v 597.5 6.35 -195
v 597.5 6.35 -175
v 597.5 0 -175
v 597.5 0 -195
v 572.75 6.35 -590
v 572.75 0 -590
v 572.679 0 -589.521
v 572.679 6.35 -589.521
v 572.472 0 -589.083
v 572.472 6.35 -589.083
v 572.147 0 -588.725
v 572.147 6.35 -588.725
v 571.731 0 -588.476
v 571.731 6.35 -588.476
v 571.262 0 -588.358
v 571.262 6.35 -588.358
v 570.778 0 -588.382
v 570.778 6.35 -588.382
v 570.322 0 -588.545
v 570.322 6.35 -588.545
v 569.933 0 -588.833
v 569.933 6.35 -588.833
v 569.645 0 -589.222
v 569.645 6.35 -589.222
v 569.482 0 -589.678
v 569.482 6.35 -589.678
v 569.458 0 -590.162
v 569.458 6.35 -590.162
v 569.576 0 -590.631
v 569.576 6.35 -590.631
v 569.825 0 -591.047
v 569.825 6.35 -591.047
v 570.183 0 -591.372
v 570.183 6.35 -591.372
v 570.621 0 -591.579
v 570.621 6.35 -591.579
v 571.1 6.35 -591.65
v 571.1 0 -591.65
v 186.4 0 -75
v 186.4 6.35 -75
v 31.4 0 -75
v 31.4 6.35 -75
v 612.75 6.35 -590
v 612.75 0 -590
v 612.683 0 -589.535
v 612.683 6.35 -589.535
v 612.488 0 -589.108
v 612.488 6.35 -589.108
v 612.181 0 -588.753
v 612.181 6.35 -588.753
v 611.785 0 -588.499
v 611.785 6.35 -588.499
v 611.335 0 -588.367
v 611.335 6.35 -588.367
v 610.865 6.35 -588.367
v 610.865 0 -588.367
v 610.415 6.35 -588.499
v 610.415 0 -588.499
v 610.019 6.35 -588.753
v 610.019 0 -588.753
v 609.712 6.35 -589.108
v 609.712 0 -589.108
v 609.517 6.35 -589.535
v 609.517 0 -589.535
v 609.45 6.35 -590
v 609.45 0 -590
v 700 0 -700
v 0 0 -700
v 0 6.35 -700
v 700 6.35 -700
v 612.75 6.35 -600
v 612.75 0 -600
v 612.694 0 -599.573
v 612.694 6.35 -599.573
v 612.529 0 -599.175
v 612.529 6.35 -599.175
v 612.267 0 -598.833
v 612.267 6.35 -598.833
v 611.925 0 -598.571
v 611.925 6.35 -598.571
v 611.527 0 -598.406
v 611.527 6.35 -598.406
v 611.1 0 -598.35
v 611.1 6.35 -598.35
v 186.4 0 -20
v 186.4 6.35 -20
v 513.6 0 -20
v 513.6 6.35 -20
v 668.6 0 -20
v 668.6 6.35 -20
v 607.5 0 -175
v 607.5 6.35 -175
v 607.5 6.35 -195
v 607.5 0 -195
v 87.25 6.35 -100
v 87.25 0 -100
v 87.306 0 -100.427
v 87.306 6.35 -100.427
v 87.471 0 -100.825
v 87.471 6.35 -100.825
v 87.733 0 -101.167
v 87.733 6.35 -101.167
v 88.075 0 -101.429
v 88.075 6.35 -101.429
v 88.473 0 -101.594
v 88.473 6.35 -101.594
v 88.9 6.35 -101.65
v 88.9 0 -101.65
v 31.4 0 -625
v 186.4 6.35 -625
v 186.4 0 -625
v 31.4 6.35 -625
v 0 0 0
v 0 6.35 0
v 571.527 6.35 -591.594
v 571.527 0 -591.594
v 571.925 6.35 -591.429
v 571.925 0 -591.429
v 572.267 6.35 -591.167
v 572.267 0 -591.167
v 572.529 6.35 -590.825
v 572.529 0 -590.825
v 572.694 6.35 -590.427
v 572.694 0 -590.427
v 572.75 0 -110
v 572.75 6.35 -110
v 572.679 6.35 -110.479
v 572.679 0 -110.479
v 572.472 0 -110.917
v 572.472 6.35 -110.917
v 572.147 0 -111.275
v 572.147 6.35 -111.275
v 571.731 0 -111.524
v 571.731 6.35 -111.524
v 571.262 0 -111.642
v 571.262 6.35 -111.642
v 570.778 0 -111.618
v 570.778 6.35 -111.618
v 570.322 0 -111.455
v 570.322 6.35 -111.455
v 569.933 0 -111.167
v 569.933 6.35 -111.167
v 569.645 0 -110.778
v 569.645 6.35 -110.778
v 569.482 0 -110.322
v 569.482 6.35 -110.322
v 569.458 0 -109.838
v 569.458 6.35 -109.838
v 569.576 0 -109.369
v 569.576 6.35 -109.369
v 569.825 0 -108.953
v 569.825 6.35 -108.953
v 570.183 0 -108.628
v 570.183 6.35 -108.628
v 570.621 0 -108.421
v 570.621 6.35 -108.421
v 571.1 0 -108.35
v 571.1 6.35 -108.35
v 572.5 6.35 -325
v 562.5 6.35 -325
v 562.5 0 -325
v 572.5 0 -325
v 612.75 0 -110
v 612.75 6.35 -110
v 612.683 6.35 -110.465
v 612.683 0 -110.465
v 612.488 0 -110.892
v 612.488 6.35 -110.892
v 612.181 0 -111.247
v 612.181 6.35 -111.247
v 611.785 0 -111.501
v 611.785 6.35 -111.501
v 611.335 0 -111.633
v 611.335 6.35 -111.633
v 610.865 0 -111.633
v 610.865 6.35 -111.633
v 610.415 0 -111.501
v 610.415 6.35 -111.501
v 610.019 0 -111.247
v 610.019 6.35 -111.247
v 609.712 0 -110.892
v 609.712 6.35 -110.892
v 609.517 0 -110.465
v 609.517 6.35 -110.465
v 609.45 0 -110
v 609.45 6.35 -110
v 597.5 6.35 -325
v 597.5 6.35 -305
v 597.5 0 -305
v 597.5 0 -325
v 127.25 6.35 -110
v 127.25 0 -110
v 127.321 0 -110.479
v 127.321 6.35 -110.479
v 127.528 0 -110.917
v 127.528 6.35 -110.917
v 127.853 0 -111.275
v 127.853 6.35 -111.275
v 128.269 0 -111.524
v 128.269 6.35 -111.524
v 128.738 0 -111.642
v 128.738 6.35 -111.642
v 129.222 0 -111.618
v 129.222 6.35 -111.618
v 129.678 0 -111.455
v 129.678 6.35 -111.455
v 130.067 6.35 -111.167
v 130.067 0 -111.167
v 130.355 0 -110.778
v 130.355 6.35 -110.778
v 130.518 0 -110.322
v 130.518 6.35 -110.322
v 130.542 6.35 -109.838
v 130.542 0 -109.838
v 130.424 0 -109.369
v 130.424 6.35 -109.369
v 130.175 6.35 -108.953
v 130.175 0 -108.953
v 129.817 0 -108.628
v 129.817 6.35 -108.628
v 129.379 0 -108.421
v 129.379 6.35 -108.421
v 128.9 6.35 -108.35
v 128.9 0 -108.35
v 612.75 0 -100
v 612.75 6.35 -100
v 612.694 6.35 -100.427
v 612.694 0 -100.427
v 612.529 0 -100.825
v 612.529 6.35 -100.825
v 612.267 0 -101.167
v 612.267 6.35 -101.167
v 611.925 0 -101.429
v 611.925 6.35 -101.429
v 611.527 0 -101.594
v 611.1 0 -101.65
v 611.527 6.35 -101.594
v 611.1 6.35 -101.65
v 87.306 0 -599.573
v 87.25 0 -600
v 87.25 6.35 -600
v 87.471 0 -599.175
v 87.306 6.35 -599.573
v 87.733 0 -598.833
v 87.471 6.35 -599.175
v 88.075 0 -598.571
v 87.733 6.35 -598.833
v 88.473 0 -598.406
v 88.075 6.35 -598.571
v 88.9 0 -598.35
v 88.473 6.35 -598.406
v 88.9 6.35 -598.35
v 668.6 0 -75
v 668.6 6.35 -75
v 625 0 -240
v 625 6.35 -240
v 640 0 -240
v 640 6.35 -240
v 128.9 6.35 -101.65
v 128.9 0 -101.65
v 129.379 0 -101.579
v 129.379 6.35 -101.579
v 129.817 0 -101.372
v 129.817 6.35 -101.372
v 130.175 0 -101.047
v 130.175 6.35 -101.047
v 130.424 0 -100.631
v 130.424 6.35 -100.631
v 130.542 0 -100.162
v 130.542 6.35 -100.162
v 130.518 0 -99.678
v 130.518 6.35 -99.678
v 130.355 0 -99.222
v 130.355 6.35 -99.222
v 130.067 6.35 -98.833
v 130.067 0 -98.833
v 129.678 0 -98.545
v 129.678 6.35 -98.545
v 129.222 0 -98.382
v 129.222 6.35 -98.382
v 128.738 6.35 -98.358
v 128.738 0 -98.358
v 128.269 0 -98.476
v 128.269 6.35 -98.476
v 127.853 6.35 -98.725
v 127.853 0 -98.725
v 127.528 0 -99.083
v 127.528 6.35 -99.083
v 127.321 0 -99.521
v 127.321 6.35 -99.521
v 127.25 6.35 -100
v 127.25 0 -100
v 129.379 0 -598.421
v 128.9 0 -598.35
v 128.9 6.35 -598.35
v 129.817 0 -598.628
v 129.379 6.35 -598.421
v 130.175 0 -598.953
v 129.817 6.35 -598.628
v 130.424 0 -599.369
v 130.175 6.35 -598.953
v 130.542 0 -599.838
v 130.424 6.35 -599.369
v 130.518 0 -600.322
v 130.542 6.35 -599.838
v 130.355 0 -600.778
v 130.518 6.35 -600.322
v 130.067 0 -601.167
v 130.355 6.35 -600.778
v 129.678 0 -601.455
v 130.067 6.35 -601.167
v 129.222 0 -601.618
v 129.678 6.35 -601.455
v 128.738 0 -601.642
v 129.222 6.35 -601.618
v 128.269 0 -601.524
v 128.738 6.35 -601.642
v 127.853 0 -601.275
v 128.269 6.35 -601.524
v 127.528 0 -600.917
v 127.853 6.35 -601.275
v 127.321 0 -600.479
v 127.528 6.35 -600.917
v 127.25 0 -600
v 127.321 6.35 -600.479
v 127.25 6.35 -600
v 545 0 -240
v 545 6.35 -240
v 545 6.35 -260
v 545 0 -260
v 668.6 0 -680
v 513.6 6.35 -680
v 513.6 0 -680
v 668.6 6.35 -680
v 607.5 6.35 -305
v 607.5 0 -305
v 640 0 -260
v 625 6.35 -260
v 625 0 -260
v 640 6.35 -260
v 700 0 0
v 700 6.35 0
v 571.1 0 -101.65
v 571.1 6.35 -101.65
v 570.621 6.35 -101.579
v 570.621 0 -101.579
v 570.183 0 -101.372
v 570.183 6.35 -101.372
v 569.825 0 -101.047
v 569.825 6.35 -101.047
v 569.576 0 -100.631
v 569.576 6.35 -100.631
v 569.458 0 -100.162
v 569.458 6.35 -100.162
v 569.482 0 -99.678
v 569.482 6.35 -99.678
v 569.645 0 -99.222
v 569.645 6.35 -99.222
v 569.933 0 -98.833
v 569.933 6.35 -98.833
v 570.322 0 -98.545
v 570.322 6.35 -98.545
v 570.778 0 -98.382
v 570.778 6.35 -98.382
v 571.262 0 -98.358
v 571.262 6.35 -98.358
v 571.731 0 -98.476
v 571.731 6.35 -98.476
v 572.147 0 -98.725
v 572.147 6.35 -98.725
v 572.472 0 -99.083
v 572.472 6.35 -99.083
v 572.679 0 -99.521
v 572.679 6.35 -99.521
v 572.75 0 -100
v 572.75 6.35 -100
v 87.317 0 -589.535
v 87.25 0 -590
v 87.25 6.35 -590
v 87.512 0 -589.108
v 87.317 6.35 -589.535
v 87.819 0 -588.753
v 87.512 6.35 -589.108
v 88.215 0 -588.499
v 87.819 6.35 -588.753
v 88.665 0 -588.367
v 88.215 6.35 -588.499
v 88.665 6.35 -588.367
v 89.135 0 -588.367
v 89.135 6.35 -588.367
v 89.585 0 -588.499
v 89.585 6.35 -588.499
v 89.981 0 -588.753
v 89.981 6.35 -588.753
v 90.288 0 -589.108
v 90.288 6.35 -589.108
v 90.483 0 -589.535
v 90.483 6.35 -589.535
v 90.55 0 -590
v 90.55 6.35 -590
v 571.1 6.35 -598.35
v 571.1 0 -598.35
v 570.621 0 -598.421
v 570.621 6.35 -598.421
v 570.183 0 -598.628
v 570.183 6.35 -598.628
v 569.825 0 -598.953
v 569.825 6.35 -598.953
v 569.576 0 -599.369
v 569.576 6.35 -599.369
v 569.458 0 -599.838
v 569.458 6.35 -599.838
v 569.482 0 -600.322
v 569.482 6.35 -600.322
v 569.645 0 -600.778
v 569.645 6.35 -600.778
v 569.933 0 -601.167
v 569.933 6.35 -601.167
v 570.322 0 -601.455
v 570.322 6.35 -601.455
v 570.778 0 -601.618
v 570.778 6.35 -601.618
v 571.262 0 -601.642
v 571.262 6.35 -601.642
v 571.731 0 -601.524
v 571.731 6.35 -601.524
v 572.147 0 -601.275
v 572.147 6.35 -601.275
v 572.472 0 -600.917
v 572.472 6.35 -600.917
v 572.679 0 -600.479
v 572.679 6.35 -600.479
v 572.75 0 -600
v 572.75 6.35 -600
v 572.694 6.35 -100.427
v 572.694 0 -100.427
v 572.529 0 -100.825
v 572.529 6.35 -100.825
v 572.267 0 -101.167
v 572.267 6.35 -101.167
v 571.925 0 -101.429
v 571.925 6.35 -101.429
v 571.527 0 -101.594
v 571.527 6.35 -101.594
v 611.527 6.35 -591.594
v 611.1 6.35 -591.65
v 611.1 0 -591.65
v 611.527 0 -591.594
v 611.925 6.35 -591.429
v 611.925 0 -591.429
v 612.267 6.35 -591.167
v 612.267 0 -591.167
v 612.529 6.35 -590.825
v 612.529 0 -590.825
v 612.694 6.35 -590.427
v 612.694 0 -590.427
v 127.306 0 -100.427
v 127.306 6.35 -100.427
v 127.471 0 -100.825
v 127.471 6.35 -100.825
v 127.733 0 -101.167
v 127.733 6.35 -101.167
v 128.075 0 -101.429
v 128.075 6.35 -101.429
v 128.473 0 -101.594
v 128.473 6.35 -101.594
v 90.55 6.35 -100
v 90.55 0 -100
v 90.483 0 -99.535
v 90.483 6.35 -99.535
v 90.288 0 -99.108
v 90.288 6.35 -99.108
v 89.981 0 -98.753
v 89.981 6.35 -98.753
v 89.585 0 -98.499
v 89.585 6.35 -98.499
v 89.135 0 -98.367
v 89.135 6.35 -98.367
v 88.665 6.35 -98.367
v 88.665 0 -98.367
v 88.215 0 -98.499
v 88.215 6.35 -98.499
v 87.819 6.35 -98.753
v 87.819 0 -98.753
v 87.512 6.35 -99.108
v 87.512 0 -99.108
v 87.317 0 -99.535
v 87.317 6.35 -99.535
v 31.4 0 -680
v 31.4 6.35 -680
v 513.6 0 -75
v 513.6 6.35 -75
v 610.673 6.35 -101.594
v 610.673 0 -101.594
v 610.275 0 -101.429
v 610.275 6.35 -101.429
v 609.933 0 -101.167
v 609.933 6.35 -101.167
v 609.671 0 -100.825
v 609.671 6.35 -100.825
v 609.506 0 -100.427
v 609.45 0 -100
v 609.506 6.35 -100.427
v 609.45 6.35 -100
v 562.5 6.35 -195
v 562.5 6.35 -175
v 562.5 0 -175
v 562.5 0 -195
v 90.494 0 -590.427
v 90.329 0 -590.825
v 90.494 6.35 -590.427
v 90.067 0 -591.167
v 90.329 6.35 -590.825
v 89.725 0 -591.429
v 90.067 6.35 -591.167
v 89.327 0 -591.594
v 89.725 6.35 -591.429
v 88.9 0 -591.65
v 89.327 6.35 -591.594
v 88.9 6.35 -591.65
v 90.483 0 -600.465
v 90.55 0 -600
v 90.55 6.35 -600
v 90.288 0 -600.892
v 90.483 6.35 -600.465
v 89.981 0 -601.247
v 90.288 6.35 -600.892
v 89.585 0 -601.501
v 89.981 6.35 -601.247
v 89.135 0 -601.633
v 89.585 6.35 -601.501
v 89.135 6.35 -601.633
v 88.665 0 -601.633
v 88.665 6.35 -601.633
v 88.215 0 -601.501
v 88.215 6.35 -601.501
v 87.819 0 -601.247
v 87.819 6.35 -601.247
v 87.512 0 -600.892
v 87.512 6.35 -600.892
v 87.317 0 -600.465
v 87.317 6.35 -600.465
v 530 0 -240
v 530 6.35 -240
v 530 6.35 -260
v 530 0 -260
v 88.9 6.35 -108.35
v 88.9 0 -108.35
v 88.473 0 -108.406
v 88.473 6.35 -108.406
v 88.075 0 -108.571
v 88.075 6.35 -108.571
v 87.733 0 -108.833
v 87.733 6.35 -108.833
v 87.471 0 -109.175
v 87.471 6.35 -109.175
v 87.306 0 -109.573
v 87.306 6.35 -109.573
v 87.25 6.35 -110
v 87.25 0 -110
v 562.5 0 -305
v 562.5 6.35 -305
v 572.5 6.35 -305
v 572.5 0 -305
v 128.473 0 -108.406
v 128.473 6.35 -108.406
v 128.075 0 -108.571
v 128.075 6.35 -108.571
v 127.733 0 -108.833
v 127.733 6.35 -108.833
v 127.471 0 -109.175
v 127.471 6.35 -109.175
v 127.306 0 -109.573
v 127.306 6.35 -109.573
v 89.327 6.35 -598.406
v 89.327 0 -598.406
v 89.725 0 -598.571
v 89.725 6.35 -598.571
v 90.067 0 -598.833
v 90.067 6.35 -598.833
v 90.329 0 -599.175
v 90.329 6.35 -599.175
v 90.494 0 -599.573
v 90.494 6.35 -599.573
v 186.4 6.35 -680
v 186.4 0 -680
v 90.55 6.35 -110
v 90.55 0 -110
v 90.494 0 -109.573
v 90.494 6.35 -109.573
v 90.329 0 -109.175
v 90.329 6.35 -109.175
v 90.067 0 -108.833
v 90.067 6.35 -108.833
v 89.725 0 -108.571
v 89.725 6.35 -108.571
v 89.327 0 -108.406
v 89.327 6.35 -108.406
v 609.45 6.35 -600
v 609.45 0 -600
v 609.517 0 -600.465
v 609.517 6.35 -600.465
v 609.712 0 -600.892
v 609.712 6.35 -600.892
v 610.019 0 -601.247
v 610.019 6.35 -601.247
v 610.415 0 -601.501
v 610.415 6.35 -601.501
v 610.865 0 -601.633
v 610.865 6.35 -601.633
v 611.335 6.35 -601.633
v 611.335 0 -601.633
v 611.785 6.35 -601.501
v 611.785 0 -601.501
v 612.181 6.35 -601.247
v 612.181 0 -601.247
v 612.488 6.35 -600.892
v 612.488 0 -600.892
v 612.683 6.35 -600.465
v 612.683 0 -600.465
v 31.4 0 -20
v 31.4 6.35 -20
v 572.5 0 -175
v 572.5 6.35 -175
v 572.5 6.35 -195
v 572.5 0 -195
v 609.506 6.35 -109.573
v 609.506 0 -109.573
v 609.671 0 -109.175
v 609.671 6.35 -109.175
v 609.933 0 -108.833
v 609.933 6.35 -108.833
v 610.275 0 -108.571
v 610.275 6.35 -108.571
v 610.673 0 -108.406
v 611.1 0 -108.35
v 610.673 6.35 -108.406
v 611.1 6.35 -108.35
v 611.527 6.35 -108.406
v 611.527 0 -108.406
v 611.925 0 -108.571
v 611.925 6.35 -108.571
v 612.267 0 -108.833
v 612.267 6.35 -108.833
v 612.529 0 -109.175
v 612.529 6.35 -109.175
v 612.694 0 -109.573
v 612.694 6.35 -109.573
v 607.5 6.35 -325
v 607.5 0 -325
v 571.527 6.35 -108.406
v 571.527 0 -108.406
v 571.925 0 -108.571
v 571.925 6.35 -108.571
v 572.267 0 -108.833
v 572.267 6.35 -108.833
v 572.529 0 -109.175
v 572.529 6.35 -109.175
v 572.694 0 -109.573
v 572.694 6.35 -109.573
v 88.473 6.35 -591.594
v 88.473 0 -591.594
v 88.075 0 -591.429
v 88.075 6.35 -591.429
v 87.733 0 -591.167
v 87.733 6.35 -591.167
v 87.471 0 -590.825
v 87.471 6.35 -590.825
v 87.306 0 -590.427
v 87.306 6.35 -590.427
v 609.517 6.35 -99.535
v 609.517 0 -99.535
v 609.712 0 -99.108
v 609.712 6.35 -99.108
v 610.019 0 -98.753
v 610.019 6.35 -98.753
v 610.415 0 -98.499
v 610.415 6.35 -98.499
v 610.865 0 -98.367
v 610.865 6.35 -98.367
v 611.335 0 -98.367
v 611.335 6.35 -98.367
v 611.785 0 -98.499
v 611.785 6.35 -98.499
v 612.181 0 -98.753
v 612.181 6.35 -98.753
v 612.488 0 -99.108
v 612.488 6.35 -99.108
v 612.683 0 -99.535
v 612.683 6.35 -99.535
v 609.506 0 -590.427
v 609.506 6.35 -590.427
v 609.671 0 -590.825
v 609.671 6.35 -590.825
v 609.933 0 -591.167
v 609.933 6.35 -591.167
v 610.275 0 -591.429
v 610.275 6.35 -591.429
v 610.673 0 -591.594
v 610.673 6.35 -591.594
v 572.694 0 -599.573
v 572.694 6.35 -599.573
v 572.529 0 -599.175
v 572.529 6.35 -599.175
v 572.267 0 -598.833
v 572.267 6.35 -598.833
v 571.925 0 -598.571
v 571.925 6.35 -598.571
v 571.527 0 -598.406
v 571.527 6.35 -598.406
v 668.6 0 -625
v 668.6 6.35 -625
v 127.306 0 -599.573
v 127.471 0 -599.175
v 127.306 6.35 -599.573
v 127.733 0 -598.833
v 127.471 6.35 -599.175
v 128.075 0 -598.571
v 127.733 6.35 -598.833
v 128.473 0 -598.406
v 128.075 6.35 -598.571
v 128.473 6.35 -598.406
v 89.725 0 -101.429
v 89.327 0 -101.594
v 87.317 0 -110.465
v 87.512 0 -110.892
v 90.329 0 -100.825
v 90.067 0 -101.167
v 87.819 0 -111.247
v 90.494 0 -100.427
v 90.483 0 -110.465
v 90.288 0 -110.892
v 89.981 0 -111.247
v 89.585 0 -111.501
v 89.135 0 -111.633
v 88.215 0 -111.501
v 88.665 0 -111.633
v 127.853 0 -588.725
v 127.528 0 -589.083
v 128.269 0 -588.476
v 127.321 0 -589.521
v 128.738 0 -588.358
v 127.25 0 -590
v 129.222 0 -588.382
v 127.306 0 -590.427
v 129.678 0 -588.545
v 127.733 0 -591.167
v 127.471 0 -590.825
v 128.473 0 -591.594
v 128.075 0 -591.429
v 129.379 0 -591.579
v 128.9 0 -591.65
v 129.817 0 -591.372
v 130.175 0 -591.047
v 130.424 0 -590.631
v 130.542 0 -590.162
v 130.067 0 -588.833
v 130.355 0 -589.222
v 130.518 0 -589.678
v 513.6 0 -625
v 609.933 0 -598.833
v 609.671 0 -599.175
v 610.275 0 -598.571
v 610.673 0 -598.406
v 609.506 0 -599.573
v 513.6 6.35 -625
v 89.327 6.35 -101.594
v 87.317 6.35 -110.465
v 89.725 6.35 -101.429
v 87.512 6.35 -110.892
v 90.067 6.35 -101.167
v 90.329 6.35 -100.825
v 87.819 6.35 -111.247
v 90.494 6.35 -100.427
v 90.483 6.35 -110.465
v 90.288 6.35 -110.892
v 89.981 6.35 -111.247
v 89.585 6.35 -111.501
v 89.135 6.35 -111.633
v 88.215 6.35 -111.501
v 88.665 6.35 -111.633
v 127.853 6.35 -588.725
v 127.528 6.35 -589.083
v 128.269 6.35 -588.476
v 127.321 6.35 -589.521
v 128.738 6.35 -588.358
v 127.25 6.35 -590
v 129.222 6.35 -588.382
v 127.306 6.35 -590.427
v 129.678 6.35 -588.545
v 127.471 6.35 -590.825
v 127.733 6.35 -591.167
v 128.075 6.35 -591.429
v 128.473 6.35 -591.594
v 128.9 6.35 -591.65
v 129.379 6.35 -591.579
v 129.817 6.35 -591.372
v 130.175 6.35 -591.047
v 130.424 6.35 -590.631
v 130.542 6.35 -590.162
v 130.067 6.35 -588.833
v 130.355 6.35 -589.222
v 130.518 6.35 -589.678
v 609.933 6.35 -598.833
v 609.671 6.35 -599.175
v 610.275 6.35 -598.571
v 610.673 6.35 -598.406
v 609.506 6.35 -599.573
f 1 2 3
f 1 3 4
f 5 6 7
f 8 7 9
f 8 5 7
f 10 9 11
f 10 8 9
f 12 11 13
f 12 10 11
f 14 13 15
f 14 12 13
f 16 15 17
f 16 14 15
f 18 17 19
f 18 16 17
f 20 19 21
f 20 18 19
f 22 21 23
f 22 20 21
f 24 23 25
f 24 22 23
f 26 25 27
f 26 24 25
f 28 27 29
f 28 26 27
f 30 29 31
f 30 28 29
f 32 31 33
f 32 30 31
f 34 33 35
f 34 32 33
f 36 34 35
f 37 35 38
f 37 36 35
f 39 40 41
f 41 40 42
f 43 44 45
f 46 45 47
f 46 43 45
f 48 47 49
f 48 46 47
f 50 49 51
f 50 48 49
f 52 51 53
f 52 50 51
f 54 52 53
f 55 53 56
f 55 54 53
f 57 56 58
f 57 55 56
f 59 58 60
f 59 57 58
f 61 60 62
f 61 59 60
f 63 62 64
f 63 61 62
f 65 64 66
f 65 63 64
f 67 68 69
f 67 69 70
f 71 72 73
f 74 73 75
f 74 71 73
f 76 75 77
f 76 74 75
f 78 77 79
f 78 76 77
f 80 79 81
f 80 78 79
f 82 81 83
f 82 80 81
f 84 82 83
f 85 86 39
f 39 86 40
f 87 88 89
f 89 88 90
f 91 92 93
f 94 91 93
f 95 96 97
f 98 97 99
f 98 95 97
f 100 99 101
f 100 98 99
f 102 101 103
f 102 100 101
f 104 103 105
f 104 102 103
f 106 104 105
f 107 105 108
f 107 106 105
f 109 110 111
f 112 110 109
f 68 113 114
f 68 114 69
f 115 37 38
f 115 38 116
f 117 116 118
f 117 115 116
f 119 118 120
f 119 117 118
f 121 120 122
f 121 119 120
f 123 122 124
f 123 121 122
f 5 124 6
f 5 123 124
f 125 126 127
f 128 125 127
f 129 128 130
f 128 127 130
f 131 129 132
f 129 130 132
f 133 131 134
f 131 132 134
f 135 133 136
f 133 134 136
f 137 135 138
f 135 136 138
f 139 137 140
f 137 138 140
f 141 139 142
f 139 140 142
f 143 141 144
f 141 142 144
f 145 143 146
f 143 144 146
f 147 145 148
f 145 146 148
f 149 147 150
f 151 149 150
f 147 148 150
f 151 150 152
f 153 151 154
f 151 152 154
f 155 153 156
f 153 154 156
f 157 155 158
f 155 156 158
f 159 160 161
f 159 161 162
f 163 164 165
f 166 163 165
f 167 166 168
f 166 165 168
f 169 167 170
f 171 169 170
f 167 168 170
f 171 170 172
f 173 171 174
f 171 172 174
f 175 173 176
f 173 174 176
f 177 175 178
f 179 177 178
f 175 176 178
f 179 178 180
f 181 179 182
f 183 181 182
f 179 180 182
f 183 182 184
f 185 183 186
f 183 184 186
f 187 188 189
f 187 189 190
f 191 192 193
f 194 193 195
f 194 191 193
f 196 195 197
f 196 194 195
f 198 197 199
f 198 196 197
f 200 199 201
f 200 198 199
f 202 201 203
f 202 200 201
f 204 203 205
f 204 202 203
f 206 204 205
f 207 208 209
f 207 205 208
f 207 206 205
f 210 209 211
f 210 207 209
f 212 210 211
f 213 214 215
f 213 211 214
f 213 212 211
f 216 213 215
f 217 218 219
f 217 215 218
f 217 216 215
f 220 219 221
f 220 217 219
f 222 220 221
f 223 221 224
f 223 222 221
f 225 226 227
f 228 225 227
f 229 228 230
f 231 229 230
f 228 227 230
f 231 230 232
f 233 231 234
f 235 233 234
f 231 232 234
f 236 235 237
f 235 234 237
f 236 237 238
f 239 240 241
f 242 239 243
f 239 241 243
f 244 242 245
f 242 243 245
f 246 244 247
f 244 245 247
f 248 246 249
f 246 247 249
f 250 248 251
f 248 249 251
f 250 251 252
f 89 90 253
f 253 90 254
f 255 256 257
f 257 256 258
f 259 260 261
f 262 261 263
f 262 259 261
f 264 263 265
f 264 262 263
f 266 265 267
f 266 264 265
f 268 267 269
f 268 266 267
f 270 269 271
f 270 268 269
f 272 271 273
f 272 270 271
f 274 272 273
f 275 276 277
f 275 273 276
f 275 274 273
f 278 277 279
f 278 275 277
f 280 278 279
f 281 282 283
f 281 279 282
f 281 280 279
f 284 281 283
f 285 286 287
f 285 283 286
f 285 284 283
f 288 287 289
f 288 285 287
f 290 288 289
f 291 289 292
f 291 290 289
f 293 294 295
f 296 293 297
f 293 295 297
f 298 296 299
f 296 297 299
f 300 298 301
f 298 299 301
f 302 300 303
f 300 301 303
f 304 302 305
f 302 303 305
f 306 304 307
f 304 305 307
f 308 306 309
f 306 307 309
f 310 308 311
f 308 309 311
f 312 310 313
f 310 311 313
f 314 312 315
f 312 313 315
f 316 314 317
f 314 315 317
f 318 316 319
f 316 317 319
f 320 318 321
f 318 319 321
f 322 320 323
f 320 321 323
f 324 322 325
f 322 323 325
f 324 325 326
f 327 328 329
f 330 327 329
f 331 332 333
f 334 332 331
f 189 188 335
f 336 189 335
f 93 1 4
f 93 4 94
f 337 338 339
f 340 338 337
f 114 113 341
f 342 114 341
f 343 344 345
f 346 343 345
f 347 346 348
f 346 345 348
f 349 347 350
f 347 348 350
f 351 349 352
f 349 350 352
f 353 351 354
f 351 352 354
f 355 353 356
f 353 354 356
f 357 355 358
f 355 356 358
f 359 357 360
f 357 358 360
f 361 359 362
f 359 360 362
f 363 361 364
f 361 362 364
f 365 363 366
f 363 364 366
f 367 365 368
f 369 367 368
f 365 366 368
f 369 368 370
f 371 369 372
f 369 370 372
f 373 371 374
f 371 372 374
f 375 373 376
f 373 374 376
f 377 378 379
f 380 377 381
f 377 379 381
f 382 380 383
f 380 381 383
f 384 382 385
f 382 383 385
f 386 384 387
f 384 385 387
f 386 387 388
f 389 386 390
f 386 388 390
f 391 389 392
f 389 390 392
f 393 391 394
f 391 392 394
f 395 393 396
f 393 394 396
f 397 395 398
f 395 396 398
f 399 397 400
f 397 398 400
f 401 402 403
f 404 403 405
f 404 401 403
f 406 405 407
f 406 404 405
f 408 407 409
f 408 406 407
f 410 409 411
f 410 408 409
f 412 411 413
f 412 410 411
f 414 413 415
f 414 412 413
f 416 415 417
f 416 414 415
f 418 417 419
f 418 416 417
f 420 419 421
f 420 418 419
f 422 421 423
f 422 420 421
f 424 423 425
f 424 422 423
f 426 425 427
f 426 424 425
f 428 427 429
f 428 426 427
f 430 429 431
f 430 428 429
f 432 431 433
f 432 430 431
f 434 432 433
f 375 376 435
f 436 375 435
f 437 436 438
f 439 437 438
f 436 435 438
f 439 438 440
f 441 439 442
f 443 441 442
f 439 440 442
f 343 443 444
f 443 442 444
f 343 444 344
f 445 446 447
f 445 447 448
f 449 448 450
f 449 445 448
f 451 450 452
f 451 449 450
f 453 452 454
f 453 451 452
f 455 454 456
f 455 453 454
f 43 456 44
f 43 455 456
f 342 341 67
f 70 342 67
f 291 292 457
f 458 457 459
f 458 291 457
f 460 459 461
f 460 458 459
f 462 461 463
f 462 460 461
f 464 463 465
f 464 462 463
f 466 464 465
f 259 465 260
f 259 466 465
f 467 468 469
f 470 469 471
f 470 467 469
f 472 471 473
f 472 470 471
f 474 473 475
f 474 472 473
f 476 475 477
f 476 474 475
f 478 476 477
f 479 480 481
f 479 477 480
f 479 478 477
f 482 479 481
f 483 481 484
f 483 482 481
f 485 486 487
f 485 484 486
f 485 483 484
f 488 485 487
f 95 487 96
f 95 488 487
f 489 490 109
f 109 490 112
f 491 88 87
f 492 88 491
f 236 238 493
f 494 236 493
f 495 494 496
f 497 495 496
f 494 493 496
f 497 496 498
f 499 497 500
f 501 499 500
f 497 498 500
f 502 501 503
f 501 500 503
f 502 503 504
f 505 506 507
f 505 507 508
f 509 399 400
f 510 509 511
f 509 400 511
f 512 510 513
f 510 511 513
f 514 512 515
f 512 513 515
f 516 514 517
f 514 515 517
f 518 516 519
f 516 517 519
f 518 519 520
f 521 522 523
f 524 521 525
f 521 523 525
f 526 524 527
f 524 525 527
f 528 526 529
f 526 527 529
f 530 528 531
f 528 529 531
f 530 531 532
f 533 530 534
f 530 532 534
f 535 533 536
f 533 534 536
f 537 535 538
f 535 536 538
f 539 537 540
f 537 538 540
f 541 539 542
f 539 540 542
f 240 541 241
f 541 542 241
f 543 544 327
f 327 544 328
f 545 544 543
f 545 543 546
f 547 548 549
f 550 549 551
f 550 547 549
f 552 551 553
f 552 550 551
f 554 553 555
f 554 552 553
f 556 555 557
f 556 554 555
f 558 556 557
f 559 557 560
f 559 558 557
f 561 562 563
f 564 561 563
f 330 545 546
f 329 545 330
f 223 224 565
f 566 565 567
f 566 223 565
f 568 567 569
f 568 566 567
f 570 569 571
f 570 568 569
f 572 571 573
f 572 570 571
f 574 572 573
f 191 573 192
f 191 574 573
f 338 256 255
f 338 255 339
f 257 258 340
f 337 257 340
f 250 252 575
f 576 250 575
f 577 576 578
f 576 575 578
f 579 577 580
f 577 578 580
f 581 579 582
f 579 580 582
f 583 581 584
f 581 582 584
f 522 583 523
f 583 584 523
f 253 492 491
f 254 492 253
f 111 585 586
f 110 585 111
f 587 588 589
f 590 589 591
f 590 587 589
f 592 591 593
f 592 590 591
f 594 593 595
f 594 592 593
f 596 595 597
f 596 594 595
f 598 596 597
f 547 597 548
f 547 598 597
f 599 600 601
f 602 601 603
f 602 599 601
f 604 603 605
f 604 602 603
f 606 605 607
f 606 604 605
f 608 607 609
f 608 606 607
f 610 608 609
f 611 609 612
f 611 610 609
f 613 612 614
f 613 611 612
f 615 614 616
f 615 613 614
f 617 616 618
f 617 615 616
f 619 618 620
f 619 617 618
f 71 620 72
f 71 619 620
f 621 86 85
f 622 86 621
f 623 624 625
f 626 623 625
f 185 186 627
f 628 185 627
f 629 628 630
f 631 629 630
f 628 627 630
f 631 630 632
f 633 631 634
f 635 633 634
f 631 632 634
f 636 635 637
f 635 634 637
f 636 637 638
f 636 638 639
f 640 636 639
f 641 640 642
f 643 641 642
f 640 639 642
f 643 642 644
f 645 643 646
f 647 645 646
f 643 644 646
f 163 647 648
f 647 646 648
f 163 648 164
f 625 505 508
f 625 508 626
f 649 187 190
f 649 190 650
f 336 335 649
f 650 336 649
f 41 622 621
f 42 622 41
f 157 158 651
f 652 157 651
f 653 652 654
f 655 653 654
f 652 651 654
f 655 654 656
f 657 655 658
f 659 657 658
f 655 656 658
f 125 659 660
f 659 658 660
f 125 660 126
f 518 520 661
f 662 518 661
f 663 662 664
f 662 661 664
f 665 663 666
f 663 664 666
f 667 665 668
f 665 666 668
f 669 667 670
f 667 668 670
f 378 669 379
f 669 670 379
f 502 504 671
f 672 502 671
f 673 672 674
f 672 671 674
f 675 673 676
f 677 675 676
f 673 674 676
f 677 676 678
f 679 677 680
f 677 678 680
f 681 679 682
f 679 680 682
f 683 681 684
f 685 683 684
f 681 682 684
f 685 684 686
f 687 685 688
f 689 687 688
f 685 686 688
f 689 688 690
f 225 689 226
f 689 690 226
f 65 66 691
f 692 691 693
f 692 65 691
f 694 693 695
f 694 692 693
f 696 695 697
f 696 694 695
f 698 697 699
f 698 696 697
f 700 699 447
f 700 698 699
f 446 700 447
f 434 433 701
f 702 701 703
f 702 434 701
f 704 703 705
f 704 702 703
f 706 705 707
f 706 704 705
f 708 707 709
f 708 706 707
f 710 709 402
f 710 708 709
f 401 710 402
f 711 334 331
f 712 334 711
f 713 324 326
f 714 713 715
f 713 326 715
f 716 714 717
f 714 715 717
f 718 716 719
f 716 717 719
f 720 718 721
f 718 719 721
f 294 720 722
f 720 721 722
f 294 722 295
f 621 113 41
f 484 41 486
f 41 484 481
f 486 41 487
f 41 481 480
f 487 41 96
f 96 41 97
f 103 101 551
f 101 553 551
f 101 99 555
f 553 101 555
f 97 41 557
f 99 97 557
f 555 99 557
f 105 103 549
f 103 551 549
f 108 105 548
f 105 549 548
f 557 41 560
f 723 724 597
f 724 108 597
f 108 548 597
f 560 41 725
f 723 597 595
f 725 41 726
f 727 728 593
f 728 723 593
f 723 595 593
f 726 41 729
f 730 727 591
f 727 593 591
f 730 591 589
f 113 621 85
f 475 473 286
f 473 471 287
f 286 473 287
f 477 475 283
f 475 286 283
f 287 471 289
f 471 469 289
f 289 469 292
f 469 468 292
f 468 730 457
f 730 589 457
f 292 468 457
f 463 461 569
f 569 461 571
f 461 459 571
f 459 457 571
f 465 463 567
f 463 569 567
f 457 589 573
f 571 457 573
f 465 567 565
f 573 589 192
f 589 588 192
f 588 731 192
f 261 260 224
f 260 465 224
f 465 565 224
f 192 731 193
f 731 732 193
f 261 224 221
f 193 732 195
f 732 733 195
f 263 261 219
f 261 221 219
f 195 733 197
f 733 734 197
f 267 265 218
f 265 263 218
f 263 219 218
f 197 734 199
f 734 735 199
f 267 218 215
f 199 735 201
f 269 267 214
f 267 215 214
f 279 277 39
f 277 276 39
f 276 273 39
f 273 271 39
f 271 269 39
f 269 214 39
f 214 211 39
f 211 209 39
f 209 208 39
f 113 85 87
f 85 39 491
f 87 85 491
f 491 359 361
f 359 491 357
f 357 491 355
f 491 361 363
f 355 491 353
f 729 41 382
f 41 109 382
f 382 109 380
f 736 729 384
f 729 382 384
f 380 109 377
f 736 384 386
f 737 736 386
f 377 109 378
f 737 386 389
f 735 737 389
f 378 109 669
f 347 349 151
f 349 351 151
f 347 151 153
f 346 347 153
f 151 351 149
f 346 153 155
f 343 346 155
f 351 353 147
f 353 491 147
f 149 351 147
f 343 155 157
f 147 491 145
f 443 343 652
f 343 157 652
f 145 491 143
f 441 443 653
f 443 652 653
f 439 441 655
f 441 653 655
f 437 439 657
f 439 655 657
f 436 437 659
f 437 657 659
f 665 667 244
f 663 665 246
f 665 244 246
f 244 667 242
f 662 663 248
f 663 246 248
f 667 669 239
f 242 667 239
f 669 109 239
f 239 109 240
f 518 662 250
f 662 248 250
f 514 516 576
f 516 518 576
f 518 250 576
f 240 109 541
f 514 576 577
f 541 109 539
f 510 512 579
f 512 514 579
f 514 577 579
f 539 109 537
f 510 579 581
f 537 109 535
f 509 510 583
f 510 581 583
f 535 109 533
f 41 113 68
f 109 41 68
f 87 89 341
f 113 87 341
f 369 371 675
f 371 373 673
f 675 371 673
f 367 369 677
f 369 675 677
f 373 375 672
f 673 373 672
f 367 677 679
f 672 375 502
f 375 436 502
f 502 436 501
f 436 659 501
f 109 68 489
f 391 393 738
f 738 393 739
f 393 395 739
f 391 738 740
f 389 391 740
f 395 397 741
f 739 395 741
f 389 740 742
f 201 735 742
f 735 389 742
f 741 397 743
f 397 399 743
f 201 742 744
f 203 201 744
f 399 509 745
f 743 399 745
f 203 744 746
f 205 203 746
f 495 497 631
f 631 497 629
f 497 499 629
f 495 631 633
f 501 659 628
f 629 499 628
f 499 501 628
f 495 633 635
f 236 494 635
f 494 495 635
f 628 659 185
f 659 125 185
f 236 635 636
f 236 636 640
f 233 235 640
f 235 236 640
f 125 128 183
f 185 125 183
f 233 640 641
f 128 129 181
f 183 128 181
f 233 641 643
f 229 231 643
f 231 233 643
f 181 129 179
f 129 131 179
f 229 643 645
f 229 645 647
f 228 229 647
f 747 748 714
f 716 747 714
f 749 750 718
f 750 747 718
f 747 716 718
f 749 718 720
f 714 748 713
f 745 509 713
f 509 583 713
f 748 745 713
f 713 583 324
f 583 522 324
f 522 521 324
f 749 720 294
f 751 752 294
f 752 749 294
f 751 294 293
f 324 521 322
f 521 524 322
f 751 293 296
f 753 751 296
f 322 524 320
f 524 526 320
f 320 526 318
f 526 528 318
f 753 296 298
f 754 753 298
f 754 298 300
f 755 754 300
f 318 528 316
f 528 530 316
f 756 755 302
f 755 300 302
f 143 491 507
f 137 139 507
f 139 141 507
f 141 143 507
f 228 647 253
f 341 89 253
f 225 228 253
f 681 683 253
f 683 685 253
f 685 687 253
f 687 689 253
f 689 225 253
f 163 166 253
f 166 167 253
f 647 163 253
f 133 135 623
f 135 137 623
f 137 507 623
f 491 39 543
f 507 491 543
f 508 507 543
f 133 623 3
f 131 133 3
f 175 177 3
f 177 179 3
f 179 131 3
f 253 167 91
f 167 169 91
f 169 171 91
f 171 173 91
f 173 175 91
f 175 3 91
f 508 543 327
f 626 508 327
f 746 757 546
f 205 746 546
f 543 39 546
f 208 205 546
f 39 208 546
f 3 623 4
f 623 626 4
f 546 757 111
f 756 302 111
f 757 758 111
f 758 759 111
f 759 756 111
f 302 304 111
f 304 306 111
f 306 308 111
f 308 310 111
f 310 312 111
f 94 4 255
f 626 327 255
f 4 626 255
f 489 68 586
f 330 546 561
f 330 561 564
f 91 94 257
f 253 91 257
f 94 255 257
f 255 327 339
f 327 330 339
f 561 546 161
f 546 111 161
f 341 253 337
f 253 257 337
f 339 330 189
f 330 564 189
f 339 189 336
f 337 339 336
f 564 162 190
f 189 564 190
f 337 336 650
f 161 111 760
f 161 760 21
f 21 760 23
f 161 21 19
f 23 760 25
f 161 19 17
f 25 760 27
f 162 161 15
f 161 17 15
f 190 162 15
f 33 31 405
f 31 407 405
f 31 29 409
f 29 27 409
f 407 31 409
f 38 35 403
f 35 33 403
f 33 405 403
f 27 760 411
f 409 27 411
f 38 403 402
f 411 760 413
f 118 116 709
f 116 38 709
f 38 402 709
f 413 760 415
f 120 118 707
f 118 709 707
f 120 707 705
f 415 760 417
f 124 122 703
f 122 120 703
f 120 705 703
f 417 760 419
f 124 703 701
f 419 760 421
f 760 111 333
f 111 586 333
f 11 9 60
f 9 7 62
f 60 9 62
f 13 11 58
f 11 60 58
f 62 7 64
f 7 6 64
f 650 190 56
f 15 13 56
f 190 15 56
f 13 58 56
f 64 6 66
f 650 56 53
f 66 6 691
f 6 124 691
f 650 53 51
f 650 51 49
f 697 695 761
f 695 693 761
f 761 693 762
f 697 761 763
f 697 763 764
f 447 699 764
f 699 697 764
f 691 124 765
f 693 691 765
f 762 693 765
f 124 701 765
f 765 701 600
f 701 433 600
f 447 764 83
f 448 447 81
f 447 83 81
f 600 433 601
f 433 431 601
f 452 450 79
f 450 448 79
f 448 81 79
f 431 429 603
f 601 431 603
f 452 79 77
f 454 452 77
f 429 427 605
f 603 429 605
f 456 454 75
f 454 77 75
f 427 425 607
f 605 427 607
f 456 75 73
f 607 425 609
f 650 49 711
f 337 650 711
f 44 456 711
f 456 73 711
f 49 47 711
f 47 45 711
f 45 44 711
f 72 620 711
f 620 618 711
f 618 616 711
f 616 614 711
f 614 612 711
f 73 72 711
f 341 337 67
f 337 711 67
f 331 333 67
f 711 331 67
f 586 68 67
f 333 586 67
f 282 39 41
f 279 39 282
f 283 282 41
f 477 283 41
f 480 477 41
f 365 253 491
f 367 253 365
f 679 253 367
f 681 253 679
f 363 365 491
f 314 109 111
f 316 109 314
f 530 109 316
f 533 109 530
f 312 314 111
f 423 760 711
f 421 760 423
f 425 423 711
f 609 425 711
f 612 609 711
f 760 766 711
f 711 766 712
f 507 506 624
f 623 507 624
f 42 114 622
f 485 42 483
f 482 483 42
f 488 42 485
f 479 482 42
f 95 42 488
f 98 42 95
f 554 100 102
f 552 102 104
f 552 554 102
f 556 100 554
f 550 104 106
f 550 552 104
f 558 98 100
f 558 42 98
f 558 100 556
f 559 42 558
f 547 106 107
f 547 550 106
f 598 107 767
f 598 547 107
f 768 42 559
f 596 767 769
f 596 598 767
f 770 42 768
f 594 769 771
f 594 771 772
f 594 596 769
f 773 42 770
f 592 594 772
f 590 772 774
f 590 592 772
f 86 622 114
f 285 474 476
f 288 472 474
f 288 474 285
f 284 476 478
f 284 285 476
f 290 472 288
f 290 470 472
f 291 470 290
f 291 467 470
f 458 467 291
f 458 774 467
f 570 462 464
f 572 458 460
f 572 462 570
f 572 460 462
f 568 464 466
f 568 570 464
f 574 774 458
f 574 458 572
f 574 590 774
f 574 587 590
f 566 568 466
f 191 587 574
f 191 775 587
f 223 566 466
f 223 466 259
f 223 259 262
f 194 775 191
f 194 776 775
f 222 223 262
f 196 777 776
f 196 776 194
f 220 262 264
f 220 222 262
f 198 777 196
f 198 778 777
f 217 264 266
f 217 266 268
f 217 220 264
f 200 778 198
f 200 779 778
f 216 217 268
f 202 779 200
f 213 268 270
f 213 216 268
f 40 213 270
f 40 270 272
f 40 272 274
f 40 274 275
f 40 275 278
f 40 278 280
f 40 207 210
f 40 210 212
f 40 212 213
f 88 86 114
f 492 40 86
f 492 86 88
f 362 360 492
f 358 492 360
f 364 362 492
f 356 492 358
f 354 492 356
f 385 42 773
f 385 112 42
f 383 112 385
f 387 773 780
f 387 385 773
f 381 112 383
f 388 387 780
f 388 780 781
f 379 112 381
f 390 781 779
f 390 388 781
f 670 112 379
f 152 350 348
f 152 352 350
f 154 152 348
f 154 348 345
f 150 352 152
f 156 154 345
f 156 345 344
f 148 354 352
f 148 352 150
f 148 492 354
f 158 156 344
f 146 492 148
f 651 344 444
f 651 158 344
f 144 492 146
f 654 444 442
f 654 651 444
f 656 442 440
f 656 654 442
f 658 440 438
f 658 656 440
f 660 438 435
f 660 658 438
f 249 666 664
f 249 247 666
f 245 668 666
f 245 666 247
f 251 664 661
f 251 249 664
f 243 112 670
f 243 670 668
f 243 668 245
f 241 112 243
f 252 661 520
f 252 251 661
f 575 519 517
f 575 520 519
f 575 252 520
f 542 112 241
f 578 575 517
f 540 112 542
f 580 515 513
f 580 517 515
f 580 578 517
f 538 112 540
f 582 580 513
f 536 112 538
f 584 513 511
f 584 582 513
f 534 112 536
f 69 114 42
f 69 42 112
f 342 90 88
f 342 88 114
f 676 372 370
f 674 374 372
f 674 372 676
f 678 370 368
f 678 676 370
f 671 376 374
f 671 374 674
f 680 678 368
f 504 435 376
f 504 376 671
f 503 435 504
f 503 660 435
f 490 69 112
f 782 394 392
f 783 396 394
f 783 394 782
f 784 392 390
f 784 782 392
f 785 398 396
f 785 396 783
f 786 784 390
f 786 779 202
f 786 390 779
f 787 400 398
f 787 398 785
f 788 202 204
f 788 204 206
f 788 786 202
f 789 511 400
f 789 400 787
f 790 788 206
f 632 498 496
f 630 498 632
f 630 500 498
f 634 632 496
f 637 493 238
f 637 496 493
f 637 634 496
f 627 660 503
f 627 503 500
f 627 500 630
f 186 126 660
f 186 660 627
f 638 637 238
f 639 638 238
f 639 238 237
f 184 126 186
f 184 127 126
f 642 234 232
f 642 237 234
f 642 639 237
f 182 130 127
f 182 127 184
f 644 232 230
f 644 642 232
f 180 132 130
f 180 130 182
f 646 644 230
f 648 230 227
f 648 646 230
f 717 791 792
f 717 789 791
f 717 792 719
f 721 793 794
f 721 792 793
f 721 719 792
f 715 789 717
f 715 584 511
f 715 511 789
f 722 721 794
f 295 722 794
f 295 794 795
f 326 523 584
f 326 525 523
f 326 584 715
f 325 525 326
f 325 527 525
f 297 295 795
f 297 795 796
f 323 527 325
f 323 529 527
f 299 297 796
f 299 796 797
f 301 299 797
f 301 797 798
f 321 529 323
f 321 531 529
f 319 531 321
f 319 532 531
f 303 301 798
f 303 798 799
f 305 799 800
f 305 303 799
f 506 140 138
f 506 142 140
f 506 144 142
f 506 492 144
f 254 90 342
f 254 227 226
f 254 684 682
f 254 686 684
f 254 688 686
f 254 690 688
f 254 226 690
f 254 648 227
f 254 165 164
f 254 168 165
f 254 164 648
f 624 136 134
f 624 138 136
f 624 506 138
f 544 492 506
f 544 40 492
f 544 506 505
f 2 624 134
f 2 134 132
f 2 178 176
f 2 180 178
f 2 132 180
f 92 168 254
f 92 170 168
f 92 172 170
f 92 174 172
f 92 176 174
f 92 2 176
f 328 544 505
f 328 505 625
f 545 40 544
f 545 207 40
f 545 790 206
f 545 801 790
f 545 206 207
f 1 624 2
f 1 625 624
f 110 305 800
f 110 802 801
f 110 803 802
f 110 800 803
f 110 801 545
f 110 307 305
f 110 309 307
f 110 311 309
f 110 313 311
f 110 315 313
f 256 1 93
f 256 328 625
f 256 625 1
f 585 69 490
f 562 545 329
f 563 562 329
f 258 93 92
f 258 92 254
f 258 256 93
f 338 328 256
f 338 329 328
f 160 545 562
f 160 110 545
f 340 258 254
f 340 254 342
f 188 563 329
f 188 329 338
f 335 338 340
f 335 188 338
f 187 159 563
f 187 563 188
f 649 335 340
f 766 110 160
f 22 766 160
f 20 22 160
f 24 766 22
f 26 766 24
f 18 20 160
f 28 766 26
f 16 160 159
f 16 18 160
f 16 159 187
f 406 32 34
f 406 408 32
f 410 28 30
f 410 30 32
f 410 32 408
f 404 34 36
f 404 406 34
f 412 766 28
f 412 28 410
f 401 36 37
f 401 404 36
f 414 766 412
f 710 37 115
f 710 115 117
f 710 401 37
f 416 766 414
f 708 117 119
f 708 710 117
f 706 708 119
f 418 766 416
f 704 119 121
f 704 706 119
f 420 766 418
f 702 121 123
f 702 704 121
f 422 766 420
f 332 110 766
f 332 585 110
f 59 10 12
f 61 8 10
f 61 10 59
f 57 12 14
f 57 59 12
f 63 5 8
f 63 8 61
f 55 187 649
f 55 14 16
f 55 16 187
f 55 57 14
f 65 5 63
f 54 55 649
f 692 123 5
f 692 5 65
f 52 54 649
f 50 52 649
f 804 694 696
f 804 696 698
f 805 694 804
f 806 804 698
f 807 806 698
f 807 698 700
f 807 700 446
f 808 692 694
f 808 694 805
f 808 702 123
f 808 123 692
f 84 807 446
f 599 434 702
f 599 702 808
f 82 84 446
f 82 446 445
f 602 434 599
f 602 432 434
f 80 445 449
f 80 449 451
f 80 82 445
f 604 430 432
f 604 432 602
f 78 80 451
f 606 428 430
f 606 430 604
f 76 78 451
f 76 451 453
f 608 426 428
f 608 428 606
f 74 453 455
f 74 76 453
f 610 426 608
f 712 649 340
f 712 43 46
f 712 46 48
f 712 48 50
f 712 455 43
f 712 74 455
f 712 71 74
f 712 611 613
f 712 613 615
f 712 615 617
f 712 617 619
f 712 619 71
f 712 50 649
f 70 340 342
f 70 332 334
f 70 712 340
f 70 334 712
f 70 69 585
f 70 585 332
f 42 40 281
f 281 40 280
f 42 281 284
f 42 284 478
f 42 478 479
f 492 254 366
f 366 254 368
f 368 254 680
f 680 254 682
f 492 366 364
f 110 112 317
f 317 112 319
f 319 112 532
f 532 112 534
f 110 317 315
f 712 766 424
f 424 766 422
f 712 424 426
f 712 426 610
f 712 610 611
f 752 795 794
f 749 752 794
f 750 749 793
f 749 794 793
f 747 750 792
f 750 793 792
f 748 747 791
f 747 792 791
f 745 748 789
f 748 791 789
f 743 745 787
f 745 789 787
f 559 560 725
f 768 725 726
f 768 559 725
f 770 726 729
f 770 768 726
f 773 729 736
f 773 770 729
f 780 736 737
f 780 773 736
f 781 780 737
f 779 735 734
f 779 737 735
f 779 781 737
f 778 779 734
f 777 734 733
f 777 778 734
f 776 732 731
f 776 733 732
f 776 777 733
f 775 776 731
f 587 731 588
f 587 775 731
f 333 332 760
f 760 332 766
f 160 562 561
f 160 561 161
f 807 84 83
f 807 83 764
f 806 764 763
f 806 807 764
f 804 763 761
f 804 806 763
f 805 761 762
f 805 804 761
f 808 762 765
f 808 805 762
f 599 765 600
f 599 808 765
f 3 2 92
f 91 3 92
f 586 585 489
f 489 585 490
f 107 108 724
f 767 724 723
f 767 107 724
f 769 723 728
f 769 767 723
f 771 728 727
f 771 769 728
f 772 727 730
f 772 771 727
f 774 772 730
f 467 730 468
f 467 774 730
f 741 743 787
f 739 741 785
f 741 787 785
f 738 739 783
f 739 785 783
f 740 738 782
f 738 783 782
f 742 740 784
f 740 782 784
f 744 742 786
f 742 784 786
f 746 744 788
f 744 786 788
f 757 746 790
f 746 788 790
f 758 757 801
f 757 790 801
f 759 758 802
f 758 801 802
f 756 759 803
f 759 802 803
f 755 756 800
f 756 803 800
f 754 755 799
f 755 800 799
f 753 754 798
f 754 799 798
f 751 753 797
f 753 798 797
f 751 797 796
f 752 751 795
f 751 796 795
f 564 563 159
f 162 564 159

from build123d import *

# Parameters (mm, degrees)
SKETCH1_W                                  = 700
SKETCH1_H                                  = 700
BOSS_EXTRUDE1_DEPTH                        = 6.35
SKETCH2_W                                  = 155
SKETCH2_H                                  = 55
CUT_EXTRUDE2_DEPTH                         = 10
MIRROR1_AT_THE_SECOND_PLANE_COPY_1_SKETC_W = 155
MIRROR1_AT_THE_SECOND_PLANE_COPY_1_SKETC_H = 55
MIRROR1_AT_THE_SECOND_PLANE_COPY_1_DEPTH   = 10
SKETCH3_W                                  = 10
SKETCH3_H                                  = 20
SKETCH3_W_2                                = 15
CUT_EXTRUDE3_DEPTH                         = 990.96985939


with BuildPart() as part:
    # Sketch1 → Boss-Extrude1 (new body)
    with BuildSketch(Plane(origin=(0, 0, 0), x_dir=(1, 0, 0), z_dir=(0, 1, 0))):
        with Locations((350, 350)):
            Rectangle(SKETCH1_W, SKETCH1_H)
    extrude(amount=BOSS_EXTRUDE1_DEPTH)

    # Sketch2 → Cut-Extrude2 (cut)
    with BuildSketch(Plane(origin=(0, 6.35, 0), x_dir=(1, 0, 0), z_dir=(0, 1, 0))):
        with BuildLine():
            ThreePointArc((572.75, 110), (569.933273811, 111.166726189), (571.1, 108.35))
            Line((571.1, 108.35), (571.1, 110))
            Line((571.1, 110), (572.75, 110))
        make_face()
        with BuildLine():
            Line((571.1, 110), (571.1, 108.35))
            ThreePointArc((571.1, 108.35), (572.266726189, 108.833273811), (572.75, 110))
            Line((572.75, 110), (571.1, 110))
        make_face()
        with BuildLine():
            ThreePointArc((571.1, 101.65), (569.933273811, 98.833273811), (572.75, 100))
            Line((572.75, 100), (571.1, 100))
            Line((571.1, 100), (571.1, 101.65))
        make_face()
        with BuildLine():
            Line((571.1, 100), (572.75, 100))
            ThreePointArc((572.75, 100), (572.266726189, 101.166726189), (571.1, 101.65))
            Line((571.1, 101.65), (571.1, 100))
        make_face()
        with BuildLine():
            ThreePointArc((609.45, 110), (609.933273811, 108.833273811), (611.1, 108.35))
            Line((611.1, 108.35), (611.1, 110))
            Line((611.1, 110), (609.45, 110))
        make_face()
        with BuildLine():
            Line((611.1, 110), (611.1, 108.35))
            ThreePointArc((611.1, 108.35), (612.266726189, 108.833273811), (612.75, 110))
            ThreePointArc((612.75, 110), (611.1, 111.65), (609.45, 110))
            Line((609.45, 110), (611.1, 110))
        make_face()
        with BuildLine():
            ThreePointArc((611.1, 101.65), (609.933273811, 101.166726189), (609.45, 100))
            Line((609.45, 100), (611.1, 100))
            Line((611.1, 100), (611.1, 101.65))
        make_face()
        with BuildLine():
            Line((611.1, 100), (609.45, 100))
            ThreePointArc((609.45, 100), (611.1, 98.35), (612.75, 100))
            ThreePointArc((612.75, 100), (612.266726189, 101.166726189), (611.1, 101.65))
            Line((611.1, 101.65), (611.1, 100))
        make_face()
        with Locations((591.1, 47.5)):
            Rectangle(SKETCH2_W, SKETCH2_H)
    cut_extrude2 = extrude(amount=-CUT_EXTRUDE2_DEPTH, mode=Mode.SUBTRACT)

    # Mirror1: Cut-Extrude2 across plane
    add(cut_extrude2.mirror(Plane(origin=(350, 0, 0), x_dir=(0, 0, 1), z_dir=(1, 0, 0))), mode=Mode.SUBTRACT)

    # Mirror1 at the second plane: Cut-Extrude2 across plane
    add(cut_extrude2.mirror(Plane.XY.offset(-350)), mode=Mode.SUBTRACT)

    # Mirror1 at the second plane copy 1 sketc → Mirror1 at the second plane copy 1 (cut)
    with BuildSketch(Plane(origin=(700, 6.35, -700), x_dir=(-1, 0, 0), z_dir=(0, 1, 0))):
        with BuildLine():
            ThreePointArc((572.75, 110), (569.933273811, 111.166726189), (571.1, 108.35))
            Line((571.1, 108.35), (571.1, 110))
            Line((571.1, 110), (572.75, 110))
        make_face()
        with BuildLine():
            Line((571.1, 110), (571.1, 108.35))
            ThreePointArc((571.1, 108.35), (572.266726189, 108.833273811), (572.75, 110))
            Line((572.75, 110), (571.1, 110))
        make_face()
        with BuildLine():
            ThreePointArc((571.1, 101.65), (569.933273811, 98.833273811), (572.75, 100))
            Line((572.75, 100), (571.1, 100))
            Line((571.1, 100), (571.1, 101.65))
        make_face()
        with BuildLine():
            Line((571.1, 100), (572.75, 100))
            ThreePointArc((572.75, 100), (572.266726189, 101.166726189), (571.1, 101.65))
            Line((571.1, 101.65), (571.1, 100))
        make_face()
        with BuildLine():
            ThreePointArc((609.45, 110), (609.933273811, 108.833273811), (611.1, 108.35))
            Line((611.1, 108.35), (611.1, 110))
            Line((611.1, 110), (609.45, 110))
        make_face()
        with BuildLine():
            Line((611.1, 110), (611.1, 108.35))
            ThreePointArc((611.1, 108.35), (612.266726189, 108.833273811), (612.75, 110))
            ThreePointArc((612.75, 110), (611.1, 111.65), (609.45, 110))
            Line((609.45, 110), (611.1, 110))
        make_face()
        with BuildLine():
            ThreePointArc((611.1, 101.65), (609.933273811, 101.166726189), (609.45, 100))
            Line((609.45, 100), (611.1, 100))
            Line((611.1, 100), (611.1, 101.65))
        make_face()
        with BuildLine():
            Line((611.1, 100), (609.45, 100))
            ThreePointArc((609.45, 100), (611.1, 98.35), (612.75, 100))
            ThreePointArc((612.75, 100), (612.266726189, 101.166726189), (611.1, 101.65))
            Line((611.1, 101.65), (611.1, 100))
        make_face()
        with Locations((591.1, 47.5)):
            Rectangle(MIRROR1_AT_THE_SECOND_PLANE_COPY_1_SKETC_W, MIRROR1_AT_THE_SECOND_PLANE_COPY_1_SKETC_H)
    extrude(amount=-MIRROR1_AT_THE_SECOND_PLANE_COPY_1_DEPTH, mode=Mode.SUBTRACT)

    # Sketch3 → Cut-Extrude3 (cut, through all)
    with BuildSketch(Plane(origin=(0, 6.35, 0), x_dir=(1, 0, 0), z_dir=(0, 1, 0))):
        with Locations((567.5, 315)):
            Rectangle(SKETCH3_W, SKETCH3_H)
        with Locations((602.5, 315)):
            Rectangle(SKETCH3_W, SKETCH3_H)
        with Locations((537.5, 250)):
            Rectangle(SKETCH3_W_2, SKETCH3_H)
        with Locations((632.5, 250)):
            Rectangle(SKETCH3_W_2, SKETCH3_H)
        with Locations((567.5, 185)):
            Rectangle(SKETCH3_W, SKETCH3_H)
        with Locations((602.5, 185)):
            Rectangle(SKETCH3_W, SKETCH3_H)
    extrude(amount=-CUT_EXTRUDE3_DEPTH, mode=Mode.SUBTRACT)


solid = part.part
